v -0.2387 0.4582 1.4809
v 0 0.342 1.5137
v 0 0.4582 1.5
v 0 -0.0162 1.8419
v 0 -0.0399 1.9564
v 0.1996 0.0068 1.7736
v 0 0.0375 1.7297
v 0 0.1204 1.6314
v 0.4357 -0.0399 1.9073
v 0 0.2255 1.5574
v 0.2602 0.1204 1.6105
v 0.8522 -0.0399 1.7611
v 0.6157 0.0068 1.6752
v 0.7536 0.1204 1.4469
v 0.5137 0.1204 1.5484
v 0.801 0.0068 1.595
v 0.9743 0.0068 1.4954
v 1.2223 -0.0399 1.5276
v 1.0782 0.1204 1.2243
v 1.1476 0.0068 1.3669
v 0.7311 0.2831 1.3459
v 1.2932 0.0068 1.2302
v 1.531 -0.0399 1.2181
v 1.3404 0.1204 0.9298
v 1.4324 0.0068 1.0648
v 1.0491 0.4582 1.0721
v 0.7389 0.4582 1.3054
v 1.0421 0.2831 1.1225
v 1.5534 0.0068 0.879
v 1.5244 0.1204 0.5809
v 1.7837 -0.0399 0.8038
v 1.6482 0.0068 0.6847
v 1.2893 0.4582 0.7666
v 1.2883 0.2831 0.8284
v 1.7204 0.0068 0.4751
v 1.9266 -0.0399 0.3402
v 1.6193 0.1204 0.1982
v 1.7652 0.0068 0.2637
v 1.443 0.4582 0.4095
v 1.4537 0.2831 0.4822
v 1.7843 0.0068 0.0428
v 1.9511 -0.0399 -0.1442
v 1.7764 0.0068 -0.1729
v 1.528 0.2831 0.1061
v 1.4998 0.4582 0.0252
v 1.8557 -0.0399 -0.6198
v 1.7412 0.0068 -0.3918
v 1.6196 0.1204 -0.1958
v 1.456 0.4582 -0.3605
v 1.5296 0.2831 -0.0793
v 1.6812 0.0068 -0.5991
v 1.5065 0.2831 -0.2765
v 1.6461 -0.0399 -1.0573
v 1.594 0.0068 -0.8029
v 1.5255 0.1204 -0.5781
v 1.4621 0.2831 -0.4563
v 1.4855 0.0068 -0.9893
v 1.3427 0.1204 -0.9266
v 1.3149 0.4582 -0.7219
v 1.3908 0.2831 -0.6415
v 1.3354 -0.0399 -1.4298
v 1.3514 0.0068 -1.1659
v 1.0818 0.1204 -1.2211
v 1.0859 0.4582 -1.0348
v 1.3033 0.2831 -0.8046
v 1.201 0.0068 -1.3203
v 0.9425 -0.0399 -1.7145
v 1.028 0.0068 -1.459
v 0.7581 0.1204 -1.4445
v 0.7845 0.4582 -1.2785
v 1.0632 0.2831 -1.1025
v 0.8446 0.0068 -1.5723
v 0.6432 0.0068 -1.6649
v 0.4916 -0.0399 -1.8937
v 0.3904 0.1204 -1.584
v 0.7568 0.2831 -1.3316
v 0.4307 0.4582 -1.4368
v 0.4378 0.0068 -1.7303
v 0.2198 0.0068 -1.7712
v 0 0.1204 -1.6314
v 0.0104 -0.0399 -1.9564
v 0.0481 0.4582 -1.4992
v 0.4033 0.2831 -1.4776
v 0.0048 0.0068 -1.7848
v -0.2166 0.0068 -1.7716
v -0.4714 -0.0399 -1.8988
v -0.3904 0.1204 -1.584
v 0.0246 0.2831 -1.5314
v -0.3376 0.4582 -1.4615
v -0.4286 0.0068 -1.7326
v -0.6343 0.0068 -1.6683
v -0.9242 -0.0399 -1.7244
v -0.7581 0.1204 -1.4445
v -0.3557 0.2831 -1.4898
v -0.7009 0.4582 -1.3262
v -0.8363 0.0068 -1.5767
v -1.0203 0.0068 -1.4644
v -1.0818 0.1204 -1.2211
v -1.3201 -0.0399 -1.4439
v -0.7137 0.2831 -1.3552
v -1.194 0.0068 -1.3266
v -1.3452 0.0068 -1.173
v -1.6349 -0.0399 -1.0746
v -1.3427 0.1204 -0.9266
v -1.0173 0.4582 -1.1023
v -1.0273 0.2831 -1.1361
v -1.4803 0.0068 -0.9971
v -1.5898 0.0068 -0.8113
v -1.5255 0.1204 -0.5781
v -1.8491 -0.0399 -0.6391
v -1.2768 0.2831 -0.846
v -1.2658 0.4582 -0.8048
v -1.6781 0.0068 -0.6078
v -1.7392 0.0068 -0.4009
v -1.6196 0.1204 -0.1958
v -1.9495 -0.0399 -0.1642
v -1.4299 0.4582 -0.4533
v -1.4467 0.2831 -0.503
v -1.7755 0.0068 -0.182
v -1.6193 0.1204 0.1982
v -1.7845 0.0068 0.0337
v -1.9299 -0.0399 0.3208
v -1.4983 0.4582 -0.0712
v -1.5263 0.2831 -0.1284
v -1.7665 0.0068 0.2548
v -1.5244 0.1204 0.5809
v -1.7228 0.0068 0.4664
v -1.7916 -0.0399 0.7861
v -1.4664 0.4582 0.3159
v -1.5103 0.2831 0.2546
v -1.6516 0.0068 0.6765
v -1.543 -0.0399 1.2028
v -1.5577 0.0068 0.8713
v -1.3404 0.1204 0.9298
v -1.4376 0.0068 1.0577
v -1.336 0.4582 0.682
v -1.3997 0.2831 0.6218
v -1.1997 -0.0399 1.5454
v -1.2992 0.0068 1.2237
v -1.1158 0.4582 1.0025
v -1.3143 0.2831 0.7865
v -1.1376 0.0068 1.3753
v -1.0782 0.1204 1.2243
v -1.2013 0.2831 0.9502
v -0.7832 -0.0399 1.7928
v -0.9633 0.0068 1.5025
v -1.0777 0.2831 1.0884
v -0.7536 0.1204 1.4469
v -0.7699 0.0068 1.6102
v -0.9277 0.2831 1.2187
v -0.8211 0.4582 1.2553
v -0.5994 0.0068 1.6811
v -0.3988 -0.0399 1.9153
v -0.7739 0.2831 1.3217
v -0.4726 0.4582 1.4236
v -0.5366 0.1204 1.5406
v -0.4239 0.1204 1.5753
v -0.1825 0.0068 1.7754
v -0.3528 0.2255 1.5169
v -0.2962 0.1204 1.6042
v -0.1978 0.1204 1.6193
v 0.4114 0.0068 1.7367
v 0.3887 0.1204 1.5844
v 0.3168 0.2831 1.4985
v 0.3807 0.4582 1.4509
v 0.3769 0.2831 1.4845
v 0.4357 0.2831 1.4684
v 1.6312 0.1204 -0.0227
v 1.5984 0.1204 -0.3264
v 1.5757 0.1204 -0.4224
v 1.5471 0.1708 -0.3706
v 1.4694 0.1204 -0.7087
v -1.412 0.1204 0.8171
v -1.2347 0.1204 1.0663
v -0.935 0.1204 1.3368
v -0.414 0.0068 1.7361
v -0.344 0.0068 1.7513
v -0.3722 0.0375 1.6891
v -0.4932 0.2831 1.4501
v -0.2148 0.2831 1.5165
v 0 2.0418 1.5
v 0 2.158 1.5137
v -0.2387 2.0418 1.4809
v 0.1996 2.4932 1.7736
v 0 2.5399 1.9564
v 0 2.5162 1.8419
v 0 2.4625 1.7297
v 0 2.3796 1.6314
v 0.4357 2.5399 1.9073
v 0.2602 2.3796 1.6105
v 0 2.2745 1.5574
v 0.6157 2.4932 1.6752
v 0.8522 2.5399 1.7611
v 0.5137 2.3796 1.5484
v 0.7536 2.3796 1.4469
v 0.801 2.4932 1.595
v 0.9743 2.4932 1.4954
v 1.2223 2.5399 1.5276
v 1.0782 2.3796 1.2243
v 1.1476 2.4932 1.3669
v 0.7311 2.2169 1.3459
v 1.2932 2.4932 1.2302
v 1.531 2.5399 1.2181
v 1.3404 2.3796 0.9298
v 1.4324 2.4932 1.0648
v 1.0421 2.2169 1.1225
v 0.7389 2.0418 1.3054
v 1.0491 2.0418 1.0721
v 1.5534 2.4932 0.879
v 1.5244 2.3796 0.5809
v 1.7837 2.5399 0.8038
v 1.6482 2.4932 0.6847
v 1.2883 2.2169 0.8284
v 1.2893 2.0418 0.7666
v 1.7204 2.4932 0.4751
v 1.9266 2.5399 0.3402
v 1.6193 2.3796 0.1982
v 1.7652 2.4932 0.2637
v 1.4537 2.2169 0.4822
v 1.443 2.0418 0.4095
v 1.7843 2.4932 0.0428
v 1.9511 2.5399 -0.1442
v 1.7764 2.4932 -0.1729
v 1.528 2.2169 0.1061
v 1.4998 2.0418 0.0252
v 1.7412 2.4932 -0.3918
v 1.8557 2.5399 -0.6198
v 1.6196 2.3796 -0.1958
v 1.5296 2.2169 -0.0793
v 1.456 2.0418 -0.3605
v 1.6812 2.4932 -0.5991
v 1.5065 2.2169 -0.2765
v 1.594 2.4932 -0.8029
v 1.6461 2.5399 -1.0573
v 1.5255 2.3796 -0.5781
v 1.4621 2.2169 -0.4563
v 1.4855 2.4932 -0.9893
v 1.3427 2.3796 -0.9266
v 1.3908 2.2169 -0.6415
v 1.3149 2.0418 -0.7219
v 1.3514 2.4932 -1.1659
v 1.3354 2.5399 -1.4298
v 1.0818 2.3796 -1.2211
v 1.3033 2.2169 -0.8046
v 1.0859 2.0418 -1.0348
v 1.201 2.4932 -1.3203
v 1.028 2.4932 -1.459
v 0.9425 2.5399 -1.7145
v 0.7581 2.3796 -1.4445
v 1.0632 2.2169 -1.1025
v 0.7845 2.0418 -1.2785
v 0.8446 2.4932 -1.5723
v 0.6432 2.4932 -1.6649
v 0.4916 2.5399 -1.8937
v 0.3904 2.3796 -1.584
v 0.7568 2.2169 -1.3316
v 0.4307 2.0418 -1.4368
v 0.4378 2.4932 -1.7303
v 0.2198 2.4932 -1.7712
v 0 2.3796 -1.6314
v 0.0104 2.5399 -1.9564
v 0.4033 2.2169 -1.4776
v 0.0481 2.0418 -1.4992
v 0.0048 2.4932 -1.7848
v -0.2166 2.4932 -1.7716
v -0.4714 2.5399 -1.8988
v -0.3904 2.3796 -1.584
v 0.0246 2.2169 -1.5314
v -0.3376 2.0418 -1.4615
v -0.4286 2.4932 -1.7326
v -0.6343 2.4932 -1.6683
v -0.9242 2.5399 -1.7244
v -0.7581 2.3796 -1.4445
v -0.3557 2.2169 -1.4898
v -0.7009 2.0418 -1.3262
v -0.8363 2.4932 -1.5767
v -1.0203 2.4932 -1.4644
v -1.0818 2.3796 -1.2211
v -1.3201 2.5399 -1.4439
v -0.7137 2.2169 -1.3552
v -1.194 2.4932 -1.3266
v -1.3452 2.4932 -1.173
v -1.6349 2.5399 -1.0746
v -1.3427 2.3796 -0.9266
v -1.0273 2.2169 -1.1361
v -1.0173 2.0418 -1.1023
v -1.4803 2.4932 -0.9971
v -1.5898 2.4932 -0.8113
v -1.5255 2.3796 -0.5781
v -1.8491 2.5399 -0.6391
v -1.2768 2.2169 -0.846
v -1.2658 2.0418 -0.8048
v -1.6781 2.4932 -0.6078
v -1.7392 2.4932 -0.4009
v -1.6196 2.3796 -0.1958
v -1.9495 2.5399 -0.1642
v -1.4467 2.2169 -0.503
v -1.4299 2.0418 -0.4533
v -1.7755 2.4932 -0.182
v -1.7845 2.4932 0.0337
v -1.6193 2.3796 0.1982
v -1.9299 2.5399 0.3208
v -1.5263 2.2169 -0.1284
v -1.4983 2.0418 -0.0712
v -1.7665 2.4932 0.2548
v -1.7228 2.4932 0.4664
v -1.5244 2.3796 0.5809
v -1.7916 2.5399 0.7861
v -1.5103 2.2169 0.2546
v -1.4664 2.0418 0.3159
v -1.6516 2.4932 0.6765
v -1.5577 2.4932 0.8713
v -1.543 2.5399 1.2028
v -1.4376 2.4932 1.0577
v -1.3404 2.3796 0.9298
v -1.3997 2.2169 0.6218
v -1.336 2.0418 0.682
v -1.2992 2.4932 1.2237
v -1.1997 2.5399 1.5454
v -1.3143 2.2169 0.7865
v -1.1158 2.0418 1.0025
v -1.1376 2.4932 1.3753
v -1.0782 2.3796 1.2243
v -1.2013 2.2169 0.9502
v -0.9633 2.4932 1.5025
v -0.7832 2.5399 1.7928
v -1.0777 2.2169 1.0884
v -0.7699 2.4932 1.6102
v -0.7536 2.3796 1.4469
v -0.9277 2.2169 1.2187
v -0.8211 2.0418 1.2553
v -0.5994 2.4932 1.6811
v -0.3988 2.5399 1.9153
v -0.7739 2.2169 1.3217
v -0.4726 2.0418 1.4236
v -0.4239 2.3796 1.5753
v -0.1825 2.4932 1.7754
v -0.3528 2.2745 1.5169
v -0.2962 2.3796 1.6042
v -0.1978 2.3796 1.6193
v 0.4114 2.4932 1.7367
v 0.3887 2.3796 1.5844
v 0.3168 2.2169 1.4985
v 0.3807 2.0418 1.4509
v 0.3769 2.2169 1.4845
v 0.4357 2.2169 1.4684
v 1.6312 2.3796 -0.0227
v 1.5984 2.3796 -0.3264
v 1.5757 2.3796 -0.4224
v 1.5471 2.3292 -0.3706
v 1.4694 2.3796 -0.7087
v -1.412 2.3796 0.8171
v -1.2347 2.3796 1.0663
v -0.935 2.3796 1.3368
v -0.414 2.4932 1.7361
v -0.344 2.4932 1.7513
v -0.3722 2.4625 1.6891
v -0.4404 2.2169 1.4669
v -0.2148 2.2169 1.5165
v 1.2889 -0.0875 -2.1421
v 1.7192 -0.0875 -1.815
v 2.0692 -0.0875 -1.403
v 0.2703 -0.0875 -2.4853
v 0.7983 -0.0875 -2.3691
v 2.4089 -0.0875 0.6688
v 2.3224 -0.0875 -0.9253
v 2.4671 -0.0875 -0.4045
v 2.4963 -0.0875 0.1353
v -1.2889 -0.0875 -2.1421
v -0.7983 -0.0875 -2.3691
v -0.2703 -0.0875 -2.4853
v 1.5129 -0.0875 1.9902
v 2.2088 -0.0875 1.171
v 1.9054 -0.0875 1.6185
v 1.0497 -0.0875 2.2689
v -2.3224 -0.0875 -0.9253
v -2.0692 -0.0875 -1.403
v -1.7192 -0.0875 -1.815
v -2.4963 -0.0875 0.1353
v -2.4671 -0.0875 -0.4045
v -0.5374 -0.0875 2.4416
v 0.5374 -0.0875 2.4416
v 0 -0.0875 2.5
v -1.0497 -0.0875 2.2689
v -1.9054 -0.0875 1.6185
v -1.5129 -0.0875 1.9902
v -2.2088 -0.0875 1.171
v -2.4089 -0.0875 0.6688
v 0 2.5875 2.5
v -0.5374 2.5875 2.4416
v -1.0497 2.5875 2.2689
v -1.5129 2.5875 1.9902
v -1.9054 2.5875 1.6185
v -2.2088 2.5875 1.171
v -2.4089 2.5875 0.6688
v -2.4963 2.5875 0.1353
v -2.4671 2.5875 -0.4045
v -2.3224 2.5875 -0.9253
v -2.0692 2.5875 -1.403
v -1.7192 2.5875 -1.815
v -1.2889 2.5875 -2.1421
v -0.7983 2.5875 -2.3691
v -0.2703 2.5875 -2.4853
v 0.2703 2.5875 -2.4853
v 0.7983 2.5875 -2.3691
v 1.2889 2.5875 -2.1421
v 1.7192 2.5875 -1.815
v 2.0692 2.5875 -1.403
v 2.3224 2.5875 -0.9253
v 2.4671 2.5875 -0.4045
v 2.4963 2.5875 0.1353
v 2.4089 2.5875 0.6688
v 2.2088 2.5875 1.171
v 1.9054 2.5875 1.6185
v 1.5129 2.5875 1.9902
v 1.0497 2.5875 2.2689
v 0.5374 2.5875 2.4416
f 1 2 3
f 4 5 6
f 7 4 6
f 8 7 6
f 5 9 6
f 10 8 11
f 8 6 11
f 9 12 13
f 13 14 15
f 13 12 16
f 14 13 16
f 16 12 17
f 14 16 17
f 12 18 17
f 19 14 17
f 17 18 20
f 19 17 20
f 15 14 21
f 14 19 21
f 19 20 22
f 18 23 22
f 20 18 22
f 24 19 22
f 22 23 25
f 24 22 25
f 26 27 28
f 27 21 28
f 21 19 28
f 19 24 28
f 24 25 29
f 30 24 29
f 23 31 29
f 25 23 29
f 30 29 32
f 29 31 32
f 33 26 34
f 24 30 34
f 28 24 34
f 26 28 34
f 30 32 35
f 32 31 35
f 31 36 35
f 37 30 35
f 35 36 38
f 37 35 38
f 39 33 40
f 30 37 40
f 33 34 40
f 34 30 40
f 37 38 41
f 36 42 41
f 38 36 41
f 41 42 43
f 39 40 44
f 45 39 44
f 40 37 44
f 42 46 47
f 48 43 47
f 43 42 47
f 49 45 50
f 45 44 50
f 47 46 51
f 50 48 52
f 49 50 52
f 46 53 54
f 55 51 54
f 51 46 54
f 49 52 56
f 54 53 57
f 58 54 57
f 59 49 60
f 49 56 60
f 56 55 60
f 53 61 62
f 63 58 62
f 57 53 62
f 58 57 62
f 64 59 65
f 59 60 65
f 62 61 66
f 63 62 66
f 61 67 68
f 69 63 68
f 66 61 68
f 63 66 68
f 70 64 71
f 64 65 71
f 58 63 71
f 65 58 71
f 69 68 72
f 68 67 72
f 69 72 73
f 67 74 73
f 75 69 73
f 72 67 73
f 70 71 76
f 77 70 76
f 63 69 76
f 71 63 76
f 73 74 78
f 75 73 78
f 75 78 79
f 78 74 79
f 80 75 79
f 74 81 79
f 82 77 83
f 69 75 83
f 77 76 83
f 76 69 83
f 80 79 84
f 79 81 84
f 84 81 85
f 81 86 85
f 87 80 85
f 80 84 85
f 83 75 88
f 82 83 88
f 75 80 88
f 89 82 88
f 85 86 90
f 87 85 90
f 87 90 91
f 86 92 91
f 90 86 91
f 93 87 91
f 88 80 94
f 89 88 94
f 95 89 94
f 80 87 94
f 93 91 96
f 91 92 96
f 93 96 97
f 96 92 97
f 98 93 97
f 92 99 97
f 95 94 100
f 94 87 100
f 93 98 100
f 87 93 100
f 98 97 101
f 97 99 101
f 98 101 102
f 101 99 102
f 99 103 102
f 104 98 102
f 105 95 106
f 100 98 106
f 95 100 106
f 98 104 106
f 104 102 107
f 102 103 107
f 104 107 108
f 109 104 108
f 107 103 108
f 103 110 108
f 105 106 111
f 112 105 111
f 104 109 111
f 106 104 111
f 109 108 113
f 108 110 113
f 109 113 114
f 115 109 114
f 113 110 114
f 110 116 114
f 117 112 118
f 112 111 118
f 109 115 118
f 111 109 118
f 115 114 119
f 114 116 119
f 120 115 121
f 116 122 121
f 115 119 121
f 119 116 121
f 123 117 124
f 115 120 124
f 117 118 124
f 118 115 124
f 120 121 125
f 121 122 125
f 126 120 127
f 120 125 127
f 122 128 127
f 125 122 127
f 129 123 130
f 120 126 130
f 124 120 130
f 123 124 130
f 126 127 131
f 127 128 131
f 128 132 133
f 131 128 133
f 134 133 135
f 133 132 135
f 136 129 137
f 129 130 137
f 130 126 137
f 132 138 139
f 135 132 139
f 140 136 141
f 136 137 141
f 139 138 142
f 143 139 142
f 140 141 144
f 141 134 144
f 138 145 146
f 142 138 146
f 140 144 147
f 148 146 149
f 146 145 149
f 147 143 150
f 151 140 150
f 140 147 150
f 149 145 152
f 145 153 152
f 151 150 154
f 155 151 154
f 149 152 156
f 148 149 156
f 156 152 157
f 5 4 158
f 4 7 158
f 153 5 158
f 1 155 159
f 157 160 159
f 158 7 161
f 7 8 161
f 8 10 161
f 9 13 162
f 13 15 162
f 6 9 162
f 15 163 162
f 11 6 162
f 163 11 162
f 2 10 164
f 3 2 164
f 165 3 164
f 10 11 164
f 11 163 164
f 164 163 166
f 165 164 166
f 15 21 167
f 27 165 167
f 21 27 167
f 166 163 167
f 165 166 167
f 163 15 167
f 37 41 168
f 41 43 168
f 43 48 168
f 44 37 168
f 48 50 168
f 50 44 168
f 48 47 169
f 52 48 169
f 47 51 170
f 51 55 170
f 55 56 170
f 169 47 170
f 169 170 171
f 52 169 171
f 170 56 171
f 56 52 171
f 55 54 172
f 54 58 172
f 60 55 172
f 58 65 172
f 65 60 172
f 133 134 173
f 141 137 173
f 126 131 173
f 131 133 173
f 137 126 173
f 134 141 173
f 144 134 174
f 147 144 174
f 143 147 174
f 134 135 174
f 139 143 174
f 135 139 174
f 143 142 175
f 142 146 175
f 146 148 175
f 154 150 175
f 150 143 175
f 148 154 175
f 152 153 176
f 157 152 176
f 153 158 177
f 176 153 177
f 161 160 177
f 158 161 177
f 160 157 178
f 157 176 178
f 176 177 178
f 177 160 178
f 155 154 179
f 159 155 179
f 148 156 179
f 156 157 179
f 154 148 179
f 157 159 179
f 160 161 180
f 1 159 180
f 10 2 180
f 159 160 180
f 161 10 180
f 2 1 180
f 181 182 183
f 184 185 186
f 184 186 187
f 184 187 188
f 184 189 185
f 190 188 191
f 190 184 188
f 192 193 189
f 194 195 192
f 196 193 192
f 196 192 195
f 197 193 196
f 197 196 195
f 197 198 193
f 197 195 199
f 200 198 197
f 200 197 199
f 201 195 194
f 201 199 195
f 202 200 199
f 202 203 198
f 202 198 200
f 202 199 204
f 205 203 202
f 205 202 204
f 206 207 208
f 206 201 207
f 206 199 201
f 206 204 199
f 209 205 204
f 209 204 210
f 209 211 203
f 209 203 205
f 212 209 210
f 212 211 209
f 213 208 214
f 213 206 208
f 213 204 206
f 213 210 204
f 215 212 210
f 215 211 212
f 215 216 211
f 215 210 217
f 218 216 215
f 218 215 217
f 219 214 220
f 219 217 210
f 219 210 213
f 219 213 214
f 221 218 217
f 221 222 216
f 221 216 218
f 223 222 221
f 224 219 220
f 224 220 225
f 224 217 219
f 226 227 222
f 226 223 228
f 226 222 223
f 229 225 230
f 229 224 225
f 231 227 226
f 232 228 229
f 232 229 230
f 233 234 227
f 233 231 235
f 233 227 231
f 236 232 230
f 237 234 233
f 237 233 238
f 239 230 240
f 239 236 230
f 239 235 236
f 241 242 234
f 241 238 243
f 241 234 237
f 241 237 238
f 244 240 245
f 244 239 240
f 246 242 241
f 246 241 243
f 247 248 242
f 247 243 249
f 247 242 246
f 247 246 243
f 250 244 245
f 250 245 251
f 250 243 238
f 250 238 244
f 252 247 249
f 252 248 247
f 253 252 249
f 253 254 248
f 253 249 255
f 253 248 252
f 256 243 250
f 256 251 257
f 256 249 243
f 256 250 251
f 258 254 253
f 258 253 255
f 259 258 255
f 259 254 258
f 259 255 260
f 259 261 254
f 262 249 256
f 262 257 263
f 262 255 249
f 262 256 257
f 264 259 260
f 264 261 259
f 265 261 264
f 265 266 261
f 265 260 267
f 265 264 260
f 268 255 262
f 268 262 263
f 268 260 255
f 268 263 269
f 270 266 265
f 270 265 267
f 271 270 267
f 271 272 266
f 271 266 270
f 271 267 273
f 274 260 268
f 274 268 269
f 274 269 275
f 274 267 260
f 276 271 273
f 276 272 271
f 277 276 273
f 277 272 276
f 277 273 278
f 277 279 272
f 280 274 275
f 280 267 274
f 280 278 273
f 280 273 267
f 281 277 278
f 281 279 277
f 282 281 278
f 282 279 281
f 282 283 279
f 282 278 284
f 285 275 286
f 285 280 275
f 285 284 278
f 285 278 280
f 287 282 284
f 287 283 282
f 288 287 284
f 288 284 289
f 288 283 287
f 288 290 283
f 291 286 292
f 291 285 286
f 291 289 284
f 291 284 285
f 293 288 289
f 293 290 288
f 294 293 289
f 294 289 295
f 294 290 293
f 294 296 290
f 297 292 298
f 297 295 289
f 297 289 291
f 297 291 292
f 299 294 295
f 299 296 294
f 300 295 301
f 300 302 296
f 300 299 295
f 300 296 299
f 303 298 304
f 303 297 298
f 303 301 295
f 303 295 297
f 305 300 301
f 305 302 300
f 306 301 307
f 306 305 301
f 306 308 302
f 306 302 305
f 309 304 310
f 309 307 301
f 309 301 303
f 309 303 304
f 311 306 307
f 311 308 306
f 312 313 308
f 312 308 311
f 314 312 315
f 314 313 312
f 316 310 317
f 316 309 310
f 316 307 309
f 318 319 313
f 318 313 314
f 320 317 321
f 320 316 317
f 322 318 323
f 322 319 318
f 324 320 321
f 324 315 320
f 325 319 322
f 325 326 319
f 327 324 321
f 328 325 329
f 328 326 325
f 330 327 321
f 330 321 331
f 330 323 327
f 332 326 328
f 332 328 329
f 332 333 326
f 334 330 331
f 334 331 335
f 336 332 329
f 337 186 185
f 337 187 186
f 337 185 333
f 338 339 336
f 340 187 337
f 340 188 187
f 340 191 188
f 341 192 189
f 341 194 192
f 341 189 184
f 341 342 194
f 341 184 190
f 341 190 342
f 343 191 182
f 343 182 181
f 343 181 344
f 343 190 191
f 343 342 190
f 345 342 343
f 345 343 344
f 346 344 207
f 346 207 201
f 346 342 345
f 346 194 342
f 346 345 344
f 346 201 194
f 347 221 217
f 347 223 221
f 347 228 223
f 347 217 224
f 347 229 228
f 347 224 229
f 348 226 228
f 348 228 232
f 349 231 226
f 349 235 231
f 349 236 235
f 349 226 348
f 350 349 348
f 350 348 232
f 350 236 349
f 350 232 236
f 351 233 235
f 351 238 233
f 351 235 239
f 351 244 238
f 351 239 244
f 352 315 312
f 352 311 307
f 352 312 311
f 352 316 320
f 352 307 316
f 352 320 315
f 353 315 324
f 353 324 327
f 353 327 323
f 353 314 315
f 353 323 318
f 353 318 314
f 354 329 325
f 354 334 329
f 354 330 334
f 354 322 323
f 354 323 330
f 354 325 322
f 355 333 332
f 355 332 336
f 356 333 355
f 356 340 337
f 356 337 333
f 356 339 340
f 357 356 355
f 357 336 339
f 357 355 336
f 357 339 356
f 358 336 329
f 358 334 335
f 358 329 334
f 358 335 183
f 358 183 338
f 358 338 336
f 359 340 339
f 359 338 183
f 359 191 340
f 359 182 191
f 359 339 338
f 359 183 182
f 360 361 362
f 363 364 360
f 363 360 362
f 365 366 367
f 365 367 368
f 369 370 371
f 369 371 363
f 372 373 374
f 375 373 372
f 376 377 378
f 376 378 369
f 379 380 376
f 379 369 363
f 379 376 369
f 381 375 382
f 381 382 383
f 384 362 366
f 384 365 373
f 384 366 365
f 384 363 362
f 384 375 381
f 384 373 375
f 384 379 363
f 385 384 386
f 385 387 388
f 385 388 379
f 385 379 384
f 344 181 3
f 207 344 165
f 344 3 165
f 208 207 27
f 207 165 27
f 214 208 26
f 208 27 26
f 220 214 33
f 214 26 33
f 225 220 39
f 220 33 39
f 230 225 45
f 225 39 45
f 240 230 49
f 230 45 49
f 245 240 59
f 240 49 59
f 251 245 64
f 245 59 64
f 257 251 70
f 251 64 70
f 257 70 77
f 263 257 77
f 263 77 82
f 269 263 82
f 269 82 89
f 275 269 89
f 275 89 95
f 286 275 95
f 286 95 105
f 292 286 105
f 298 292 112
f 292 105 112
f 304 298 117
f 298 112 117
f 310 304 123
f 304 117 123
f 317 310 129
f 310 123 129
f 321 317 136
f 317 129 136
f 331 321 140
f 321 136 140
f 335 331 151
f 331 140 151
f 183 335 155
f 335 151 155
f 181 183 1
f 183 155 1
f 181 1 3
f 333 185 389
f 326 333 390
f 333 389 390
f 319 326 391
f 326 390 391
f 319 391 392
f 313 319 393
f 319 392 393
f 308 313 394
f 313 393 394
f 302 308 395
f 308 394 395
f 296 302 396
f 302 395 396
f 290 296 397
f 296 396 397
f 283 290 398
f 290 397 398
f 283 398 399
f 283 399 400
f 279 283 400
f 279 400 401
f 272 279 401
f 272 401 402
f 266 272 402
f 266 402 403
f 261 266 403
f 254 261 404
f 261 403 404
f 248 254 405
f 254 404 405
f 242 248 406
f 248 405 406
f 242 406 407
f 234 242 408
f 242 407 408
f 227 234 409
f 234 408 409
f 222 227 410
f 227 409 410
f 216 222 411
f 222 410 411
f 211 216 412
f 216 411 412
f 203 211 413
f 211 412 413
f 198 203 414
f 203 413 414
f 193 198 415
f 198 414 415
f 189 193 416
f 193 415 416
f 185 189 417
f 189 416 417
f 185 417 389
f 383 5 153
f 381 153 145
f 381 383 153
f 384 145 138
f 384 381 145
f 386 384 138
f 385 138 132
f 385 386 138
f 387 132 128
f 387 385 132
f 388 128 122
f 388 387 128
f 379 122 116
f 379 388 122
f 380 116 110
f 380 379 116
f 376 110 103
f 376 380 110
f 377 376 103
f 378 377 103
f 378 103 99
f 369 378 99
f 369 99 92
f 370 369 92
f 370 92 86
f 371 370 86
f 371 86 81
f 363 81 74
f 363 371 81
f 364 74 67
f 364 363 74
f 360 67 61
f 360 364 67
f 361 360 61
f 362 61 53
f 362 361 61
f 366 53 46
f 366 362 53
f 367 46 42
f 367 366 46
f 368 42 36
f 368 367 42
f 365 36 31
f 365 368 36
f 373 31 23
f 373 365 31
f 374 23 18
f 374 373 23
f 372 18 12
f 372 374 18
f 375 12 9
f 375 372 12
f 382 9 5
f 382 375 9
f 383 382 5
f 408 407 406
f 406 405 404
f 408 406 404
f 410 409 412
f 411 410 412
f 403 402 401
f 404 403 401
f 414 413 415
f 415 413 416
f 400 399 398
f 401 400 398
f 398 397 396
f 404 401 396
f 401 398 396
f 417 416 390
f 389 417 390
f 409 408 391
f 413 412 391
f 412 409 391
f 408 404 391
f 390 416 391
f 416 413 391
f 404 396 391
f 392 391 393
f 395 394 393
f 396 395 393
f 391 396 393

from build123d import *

# Parameters (mm, degrees)
SKETCH1_R            = 1.5
BOSS_EXTRUDE1_DEPTH  = 2.5
FILLET1_R            = 0.5
FILLET1_OF_MIRROR1_R = 0.5


with BuildPart() as part:
    # Sketch1 → Boss-Extrude1 (new body)
    with BuildSketch(Plane(origin=(0, 0, 0), x_dir=(1, 0, 0), z_dir=(0, 1, 0))):
        with Locations(Location((0, 0, 0), (0, 0, 270))):
            Circle(SKETCH1_R)
    extrude(amount=BOSS_EXTRUDE1_DEPTH)

    # Sketch3 → Revolve1 (revolve)
    with BuildSketch(Plane(origin=(0, 0, 0), x_dir=(0, 0, -1), z_dir=(1, 0, 0)), mode=Mode.PRIVATE) as revolve1_sk:
        Polygon((1.5, 2.5), (2.5, 2.587488664), (0, 2.587488664), (0, 1.587488664), (1.5, 1.587488664), align=None)
    revolve1 = revolve(revolve1_sk.sketch.rotate(Axis((0, 2.587488664, 0), (0, -1, 0)), 180), axis=Axis((0, 2.587488664, 0), (0, -1, 0)))

    # Fillet1
    fillet1_edges = [part.edges().sort_by_distance(p)[0] for p in [
        (0, 2.5, -1.5),
    ]]
    fillet(fillet1_edges, radius=FILLET1_R)

    # Mirror1: Revolve1 across plane
    add(revolve1.mirror(Plane(origin=(0, 1.25, 0), x_dir=(0, 0, 1), z_dir=(0, -1, 0))))

    # Fillet1 of Mirror1
    fillet1_of_mirror1_edges = [part.edges().sort_by_distance(p)[0] for p in [
        (0, 0, -1.5),
    ]]
    fillet(fillet1_of_mirror1_edges, radius=FILLET1_OF_MIRROR1_R)


solid = part.part
